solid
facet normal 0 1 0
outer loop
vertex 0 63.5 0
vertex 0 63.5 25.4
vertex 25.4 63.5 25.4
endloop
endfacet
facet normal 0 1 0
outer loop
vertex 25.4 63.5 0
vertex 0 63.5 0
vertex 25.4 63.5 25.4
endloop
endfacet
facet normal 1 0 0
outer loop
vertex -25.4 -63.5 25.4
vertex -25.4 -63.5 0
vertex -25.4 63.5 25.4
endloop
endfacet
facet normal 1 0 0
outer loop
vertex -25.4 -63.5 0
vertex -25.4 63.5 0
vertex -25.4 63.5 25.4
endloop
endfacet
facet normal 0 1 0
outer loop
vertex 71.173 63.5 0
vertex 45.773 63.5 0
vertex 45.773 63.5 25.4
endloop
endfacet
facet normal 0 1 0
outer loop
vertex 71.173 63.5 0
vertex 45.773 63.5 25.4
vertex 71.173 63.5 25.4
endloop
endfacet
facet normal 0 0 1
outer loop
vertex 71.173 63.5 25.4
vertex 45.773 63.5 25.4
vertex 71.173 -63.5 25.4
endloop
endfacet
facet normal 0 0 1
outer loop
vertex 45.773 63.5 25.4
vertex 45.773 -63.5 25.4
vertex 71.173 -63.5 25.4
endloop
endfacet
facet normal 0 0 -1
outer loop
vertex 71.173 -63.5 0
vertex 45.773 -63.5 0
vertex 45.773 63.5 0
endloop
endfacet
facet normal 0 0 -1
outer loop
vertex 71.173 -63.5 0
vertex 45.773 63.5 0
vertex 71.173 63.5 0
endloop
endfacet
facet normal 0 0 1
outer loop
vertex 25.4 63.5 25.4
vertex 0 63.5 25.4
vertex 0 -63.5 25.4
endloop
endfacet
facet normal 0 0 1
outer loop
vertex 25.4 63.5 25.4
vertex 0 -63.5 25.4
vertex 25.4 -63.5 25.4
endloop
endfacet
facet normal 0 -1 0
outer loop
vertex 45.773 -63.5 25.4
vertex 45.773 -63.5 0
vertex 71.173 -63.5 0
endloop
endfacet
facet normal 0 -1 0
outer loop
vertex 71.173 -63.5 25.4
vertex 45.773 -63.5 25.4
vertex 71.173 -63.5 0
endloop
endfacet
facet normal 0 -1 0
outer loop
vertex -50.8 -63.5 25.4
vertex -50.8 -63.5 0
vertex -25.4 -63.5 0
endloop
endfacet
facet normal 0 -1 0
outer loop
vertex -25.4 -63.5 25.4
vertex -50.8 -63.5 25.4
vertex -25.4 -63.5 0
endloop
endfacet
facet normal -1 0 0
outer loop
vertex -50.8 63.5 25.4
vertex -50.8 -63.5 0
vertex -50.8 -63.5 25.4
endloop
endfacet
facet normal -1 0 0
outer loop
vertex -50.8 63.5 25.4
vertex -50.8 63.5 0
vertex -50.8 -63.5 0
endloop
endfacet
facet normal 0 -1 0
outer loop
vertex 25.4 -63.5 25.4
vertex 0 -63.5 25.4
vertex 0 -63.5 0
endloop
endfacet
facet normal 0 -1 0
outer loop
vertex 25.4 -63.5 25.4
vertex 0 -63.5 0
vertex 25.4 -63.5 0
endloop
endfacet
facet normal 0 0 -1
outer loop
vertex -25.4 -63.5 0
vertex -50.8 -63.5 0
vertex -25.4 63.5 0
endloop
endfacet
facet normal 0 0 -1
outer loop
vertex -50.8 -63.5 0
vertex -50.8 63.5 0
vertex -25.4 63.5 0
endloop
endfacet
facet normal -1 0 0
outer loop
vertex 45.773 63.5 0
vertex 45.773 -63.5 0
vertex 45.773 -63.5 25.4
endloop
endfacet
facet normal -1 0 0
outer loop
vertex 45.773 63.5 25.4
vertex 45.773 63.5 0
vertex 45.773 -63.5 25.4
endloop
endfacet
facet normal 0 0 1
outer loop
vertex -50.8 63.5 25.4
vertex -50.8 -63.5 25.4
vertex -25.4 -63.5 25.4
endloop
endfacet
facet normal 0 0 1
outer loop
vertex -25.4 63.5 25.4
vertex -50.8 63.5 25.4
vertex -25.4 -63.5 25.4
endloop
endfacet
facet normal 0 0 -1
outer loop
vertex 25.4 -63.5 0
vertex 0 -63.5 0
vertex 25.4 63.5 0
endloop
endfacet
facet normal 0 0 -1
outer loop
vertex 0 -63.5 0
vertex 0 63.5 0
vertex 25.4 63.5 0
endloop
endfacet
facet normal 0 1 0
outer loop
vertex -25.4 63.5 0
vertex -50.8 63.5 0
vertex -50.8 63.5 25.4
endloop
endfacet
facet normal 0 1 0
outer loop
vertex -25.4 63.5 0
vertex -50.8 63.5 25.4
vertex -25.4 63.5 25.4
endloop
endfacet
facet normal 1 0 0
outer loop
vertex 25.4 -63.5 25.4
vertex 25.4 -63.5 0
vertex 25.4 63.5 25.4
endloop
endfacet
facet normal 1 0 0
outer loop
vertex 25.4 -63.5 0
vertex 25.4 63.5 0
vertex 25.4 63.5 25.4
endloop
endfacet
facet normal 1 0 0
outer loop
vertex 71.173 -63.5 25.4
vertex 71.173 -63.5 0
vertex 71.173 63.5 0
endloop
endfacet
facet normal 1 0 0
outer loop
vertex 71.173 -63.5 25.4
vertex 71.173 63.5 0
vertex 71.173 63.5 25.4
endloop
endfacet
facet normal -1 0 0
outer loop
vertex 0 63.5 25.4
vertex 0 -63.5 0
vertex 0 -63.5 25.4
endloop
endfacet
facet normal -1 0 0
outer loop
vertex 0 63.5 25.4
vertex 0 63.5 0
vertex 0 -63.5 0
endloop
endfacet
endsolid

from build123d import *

# Parameters (mm, degrees)
F0_W     = 25.4
F0_H     = 25.4
F1_DEPTH = 63.5


with BuildPart() as f1:
    # F0 (on Front) → F1 (new body, symmetric)
    with BuildSketch(Plane.XZ):
        with Locations((-38.1, 12.7)):
            Rectangle(F0_W, F0_H)
        with Locations((12.7, 12.7)):
            Rectangle(F0_W, F0_H)
        with Locations((58.472919, 12.7)):
            Rectangle(F0_W, F0_H)
    extrude(amount=F1_DEPTH, both=True)


solid = f1.part
